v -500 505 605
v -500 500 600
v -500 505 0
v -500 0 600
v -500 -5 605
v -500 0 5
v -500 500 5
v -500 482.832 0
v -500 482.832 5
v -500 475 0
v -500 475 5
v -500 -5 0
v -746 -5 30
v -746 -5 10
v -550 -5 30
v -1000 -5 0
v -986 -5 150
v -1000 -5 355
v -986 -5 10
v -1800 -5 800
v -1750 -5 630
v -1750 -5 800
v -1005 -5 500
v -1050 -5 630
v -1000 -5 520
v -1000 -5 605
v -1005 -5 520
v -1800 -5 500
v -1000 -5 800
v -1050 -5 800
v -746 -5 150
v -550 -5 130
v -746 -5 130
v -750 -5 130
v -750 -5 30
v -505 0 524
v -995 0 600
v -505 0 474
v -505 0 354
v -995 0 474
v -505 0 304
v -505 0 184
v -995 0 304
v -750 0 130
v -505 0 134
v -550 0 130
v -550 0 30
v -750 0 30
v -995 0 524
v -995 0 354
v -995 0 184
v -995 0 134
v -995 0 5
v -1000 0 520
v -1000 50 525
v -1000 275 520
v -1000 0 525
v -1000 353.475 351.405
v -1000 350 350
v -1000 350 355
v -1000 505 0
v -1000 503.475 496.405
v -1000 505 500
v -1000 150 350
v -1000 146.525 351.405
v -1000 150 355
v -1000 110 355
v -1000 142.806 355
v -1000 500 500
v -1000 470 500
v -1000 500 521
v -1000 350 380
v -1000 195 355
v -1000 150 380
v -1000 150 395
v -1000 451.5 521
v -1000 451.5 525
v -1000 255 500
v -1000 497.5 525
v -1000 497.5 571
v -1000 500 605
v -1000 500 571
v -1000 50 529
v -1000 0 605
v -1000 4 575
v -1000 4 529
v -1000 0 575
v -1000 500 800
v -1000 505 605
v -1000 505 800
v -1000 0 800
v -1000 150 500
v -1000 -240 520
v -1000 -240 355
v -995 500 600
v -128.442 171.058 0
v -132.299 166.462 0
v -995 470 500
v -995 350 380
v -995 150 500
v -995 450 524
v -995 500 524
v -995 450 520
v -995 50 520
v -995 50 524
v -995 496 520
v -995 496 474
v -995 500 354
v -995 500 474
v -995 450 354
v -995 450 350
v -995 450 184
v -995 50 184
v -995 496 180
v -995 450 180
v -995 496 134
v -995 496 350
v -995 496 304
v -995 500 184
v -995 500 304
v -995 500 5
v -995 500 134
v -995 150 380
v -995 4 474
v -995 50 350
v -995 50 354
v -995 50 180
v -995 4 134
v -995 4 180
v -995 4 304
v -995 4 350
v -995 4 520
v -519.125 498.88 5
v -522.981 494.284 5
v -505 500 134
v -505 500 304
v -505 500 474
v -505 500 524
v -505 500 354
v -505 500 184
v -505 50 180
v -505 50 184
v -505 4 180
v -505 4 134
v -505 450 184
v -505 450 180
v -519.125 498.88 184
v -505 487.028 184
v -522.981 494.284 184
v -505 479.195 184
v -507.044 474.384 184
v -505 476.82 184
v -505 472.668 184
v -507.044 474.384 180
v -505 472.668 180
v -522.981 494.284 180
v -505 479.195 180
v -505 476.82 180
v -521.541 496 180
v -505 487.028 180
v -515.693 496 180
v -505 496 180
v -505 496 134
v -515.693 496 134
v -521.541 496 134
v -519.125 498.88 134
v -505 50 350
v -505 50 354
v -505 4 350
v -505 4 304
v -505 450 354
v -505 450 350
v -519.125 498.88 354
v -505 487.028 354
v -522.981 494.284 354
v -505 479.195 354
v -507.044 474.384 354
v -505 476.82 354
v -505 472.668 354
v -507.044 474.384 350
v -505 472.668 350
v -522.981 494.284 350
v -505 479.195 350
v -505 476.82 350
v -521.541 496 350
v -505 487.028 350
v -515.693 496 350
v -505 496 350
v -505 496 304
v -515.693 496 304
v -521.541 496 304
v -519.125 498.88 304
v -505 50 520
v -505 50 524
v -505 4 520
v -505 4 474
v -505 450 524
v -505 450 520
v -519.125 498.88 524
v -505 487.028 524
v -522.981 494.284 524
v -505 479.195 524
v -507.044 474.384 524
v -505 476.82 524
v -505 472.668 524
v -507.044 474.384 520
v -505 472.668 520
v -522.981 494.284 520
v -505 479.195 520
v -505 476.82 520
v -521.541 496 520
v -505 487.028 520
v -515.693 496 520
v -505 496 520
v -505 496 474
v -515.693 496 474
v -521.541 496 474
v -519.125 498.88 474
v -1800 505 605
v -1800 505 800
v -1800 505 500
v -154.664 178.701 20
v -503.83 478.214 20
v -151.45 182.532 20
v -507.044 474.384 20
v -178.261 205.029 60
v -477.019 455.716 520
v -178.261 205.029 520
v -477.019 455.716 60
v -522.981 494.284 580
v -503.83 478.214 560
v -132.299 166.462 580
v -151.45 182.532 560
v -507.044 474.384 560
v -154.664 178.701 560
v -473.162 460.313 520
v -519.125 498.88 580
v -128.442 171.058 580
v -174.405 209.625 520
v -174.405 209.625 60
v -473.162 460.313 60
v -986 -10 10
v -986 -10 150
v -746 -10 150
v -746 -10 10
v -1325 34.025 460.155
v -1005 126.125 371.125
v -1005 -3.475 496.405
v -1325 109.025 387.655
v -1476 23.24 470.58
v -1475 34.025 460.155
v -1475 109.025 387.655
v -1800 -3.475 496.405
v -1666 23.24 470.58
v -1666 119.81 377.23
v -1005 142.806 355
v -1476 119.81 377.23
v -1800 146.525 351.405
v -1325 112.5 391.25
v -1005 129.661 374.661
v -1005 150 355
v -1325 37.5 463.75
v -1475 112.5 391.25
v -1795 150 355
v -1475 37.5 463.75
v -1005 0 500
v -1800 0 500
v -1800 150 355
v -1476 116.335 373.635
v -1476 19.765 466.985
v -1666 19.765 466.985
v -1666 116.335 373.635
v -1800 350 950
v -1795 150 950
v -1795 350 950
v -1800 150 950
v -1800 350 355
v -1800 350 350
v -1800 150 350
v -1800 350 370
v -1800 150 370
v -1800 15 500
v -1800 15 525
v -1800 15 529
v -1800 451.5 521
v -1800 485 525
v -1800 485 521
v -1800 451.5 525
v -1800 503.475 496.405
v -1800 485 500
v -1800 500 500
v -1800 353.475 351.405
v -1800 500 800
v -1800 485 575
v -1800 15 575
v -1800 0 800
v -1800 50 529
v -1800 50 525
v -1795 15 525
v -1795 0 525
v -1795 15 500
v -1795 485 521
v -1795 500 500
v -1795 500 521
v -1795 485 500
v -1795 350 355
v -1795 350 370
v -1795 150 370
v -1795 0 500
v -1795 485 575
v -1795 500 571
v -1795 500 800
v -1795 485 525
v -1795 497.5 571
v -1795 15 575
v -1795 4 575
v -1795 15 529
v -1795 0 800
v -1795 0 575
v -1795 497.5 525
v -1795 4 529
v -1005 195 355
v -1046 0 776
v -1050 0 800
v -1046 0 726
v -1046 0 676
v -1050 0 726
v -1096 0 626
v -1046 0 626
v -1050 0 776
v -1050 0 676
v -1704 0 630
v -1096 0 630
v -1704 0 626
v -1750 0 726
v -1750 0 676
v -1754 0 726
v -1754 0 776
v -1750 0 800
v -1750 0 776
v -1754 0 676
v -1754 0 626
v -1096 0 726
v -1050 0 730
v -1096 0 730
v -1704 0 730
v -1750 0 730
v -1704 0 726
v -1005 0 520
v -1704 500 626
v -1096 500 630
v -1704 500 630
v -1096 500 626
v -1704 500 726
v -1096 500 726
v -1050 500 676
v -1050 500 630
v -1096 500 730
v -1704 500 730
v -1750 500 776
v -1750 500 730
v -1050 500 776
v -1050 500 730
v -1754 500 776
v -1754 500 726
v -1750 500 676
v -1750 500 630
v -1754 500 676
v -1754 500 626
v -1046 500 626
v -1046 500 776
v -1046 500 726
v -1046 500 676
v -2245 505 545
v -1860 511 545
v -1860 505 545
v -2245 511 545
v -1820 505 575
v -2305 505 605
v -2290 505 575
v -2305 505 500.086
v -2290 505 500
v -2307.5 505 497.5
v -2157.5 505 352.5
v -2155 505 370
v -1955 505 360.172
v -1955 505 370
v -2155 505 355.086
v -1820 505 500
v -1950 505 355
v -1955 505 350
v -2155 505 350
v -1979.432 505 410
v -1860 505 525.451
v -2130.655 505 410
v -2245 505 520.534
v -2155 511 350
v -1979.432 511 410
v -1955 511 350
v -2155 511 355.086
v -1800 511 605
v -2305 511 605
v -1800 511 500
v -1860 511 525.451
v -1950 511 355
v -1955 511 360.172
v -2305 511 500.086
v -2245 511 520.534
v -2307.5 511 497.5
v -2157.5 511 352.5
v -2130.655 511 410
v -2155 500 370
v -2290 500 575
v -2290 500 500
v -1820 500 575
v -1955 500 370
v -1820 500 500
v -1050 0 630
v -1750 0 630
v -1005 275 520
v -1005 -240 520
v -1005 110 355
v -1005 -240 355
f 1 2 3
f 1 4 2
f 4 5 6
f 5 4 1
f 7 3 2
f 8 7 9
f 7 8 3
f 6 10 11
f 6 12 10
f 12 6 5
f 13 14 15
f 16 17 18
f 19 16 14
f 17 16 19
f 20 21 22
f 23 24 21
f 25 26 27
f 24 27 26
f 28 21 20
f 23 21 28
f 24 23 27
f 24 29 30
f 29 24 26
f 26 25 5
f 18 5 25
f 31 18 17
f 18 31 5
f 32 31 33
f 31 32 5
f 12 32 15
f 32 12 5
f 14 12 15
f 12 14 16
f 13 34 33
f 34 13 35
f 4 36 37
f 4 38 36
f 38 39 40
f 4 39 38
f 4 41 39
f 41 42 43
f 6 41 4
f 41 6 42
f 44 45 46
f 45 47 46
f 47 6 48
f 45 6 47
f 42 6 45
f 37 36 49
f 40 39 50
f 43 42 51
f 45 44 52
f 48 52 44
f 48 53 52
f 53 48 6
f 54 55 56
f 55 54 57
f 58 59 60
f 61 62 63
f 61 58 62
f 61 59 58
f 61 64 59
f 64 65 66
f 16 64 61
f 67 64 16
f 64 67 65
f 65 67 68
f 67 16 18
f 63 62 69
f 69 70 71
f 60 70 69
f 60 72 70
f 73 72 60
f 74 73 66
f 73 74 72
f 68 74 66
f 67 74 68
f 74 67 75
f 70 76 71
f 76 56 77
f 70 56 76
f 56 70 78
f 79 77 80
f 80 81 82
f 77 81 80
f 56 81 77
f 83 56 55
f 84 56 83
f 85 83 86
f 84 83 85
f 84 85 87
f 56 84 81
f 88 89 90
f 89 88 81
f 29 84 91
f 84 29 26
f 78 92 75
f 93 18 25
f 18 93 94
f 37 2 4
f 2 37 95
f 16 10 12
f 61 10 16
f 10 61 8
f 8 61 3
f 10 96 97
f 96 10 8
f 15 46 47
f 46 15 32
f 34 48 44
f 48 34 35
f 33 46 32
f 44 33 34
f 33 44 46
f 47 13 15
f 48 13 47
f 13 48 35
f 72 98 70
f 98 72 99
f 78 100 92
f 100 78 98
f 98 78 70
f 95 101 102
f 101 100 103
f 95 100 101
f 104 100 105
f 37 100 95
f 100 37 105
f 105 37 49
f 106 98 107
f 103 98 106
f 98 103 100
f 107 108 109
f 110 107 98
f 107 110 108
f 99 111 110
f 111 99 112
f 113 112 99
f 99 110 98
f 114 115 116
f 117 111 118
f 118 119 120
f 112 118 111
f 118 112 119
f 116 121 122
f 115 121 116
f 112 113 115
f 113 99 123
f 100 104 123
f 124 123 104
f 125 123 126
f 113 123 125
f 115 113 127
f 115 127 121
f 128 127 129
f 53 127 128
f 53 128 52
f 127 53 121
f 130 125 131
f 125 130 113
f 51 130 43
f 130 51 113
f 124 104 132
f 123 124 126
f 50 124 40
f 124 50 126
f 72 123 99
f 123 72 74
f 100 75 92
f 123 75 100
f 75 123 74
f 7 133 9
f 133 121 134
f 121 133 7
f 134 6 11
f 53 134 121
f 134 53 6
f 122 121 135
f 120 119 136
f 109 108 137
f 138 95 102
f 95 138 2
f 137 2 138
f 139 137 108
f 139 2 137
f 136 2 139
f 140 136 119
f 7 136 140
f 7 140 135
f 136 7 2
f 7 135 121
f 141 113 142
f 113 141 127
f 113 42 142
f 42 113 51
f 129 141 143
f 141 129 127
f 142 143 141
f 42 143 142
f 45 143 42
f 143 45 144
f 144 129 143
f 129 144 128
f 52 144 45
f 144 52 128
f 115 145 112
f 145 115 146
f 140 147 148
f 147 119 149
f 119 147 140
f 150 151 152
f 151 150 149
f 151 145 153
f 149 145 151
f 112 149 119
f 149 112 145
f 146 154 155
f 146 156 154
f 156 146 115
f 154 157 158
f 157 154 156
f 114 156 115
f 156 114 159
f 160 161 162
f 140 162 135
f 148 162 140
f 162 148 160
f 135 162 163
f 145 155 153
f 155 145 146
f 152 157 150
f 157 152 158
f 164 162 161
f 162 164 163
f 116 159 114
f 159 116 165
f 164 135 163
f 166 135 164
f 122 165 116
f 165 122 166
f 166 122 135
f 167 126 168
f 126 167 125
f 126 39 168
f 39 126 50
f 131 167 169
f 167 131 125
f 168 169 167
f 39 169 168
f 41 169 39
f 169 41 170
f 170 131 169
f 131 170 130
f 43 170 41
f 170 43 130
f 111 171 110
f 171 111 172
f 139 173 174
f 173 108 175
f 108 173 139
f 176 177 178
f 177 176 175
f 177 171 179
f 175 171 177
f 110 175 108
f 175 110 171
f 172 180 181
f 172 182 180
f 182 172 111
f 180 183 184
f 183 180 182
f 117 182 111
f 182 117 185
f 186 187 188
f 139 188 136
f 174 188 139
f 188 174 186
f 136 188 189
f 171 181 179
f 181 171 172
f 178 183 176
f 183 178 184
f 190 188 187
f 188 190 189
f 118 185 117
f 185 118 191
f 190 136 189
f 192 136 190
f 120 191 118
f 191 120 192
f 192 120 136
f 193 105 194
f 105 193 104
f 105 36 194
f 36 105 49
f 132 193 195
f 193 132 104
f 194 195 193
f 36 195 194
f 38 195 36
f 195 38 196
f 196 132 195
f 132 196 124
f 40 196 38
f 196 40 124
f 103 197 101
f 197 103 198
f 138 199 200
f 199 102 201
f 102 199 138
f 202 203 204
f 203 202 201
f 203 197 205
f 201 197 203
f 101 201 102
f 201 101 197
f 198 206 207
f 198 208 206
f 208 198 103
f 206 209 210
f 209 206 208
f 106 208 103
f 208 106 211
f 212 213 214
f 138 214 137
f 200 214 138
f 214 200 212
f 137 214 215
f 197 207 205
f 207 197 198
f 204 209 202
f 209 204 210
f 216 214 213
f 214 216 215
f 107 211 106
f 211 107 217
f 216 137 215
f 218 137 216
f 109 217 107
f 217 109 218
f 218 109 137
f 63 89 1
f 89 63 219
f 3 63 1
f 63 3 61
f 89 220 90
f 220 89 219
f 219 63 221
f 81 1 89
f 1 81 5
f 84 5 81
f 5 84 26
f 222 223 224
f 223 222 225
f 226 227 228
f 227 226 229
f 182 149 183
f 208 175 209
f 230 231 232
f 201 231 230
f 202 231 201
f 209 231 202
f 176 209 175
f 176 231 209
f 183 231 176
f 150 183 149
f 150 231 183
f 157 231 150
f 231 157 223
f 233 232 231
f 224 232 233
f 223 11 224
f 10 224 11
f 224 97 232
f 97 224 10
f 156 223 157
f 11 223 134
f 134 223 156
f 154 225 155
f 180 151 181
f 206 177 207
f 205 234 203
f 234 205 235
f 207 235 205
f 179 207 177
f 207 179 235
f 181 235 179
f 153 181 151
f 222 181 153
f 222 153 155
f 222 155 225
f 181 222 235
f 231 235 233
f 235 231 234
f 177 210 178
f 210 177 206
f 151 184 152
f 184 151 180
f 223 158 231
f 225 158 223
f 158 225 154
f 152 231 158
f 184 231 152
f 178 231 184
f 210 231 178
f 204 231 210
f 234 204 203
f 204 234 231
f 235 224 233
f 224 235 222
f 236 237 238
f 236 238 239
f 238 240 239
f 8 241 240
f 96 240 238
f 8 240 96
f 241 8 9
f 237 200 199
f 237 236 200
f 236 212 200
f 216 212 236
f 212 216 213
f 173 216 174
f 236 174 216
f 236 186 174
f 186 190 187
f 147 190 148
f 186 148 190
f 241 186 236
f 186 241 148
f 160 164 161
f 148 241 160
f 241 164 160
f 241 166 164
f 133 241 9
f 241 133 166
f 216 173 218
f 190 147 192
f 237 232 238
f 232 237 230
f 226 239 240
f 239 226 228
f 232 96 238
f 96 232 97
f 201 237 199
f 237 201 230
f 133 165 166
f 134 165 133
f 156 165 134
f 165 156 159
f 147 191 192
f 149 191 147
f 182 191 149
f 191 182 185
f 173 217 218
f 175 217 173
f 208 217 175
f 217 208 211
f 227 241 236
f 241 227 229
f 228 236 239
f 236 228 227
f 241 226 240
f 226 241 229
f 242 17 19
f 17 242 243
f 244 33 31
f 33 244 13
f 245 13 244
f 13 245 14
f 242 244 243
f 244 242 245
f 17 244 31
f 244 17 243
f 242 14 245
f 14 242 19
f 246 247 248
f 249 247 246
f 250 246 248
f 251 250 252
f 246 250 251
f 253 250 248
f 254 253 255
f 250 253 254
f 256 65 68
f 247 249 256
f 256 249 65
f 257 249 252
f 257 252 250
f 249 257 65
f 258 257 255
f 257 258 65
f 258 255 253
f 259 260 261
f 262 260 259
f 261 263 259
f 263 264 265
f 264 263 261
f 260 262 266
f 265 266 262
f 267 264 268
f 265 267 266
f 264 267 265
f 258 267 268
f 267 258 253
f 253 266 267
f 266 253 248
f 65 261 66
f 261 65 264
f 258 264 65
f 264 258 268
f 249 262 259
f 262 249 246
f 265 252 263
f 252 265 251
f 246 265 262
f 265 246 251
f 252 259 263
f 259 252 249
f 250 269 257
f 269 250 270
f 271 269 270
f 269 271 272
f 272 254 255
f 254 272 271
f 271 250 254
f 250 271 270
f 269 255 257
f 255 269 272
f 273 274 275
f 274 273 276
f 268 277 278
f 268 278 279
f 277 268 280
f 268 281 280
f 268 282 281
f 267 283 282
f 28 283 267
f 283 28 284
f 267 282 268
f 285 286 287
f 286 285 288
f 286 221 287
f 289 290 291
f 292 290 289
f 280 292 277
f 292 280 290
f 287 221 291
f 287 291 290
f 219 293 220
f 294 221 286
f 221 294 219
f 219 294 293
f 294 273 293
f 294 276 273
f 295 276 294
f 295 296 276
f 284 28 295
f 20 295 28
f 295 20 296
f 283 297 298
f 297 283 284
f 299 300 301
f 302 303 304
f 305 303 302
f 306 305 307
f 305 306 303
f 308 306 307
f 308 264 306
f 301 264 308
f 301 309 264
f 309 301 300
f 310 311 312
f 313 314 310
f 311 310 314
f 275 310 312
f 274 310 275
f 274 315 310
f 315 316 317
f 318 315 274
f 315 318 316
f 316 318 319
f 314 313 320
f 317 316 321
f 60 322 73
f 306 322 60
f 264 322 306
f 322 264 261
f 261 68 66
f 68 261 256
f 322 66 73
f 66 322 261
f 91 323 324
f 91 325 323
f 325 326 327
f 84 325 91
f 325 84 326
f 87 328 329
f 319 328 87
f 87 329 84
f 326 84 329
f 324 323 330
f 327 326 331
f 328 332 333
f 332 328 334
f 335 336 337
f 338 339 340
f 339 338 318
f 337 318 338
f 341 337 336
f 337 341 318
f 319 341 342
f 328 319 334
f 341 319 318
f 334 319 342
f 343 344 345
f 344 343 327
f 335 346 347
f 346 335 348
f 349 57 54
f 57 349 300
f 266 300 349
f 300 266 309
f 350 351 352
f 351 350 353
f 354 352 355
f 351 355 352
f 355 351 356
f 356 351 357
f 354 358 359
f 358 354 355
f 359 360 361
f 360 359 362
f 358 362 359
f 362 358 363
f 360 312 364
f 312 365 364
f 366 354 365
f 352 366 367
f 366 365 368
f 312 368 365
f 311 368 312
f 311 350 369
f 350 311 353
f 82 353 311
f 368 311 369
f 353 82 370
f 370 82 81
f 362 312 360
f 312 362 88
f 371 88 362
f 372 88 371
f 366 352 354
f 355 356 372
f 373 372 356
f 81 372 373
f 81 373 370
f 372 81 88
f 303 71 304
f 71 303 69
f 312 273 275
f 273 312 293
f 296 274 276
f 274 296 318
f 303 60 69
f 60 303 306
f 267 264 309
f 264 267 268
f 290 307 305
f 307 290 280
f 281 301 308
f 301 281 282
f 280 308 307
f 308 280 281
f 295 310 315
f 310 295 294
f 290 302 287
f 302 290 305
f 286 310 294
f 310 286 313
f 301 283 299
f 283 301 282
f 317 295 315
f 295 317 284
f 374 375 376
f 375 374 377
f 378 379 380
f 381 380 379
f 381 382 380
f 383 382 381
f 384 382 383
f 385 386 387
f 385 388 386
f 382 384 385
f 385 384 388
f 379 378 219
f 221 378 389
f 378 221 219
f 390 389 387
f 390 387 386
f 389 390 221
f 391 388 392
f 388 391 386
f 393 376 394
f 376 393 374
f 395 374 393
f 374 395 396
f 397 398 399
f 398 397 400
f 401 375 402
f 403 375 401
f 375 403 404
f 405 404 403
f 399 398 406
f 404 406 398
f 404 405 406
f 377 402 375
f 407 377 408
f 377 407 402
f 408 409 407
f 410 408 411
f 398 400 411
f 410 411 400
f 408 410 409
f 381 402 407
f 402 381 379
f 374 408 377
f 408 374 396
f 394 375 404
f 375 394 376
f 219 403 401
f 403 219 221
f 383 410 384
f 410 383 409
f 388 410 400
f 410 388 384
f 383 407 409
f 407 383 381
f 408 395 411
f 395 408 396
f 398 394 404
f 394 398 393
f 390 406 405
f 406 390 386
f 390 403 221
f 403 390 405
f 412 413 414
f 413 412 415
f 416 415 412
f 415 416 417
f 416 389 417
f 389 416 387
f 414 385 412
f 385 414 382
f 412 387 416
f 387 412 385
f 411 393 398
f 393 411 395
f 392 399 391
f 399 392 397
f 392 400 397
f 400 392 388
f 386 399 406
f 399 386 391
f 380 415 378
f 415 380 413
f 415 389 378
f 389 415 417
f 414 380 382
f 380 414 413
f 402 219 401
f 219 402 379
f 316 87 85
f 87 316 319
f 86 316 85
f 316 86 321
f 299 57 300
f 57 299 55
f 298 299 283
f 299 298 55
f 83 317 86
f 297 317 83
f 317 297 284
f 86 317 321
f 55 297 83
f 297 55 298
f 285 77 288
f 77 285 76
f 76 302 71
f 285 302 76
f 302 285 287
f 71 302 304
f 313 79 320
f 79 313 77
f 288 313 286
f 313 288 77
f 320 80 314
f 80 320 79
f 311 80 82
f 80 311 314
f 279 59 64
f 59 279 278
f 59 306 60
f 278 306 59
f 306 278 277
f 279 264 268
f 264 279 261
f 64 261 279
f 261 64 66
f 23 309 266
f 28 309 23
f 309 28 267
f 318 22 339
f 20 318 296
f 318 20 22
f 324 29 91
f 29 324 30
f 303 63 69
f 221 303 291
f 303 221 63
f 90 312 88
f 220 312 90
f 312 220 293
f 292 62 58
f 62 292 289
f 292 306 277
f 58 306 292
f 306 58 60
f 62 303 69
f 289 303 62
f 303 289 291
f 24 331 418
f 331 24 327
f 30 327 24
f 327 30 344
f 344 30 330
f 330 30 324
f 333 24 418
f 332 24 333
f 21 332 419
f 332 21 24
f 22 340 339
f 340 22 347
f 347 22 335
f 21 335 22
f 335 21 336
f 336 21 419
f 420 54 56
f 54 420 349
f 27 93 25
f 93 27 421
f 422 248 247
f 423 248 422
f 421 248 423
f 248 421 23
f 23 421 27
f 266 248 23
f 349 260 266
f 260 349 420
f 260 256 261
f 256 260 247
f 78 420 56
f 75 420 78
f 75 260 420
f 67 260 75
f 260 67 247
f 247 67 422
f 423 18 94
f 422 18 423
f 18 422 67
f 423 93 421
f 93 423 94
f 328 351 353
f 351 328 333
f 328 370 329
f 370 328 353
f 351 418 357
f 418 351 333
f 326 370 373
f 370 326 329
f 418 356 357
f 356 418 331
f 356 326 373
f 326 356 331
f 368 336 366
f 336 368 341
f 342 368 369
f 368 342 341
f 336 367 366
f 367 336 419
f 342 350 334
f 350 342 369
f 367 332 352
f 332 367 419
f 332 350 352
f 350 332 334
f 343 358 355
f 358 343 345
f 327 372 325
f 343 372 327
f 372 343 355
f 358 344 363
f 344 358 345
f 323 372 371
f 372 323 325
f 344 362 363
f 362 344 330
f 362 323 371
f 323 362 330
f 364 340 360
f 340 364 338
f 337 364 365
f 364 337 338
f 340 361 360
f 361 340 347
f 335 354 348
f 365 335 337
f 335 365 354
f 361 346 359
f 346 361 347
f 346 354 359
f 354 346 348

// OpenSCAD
// file: helper.scad
module prism(l, w, h){
    polyhedron(
            points=[[0,0,0], [l,0,0], [l,w,0], [0,w,0], [0,w,h], [l,w,h]],
            faces=[[0,1,2,3],[5,4,3,2],[0,4,5,1],[0,3,4],[5,2,1]]
        );
}

module prism2(l, w) {
	polygon([[0,0], [l, 0], [l, w]]);
}
// main file
include <helper.scad>

//
// All numbers are in millimeter
//

thick = 5;

angleWidth = 50;
angleHeight = 50;
angleThick = 4;

// Firebox

fbW = 500;
fbD = 500;
fbH = 600;

/// Firebox basket

fbBkMinBottomOffset = 30;
fbBkMaxBottomOffset = 30;
fbBkHeight = 200;
fbBkNumRacks = 3;

/// Firebox door
fbDrD = fbD - 40;
fbDrH = fbH - 60;
fbDrHO = 20;

fbRotate = 50;

fbDrBandWidth = 60;
fbDrBandThick = 6;

/// Firebox air intake
fbAIOpen = 0.9;

// Smoke Stack
ssW = fbW;
ssD = fbD;
ssH = 800;

/// Smoke Stack door
ssDrW = ssW - 40;
ssDrH = ssH - 60;
ssDrHO = 20;

ssDrRotate = 50;

ssDrBandWidth = fbDrBandWidth;
ssDrBandThick = fbDrBandThick;

/// FireBox Crates

ssCrMinBottomOffset = 30;
ssCrMaxOffset = 70;
ssCrNumRacks = 5;

// Chamber

chamBottomD = 200;
chamTopD = 200;
chamBackH = 300;
chamFrontH = 300;
chamWidth = 800;
chamOffset = 350; // the Z offset of the chamber in relation to the firebox
chamHeight = 600;
chamFrontBackOffset = 150;

/// Chamber Door

chamDoorWidth = chamWidth - 100;
chamDoorDepth = 250;
chamDoorHeight = 325;
chamDoorRotate = 70;

chamBandWidth = fbDrBandWidth;
chamBandThick = fbDrBandThick;

/// Chamber Face Door

chamFaceDoorHeight = 75;
chamFaceSealWidth = 30;
chamFaceDoorRotate = 90;

chamFaceBandWidth = fbDrBandWidth;
chamFaceBandThick = fbDrBandThick;

/// Chamber Air Intake
chamAIOpen = 0.9;

// Firebox - Chamber Hatch

fbChamPercentOpen = 0.6;

module angle(l) {
	union() {
		cube([angleWidth, l, angleThick]);	
		translate([0,0, -(angleHeight - angleThick)]) {
			cube([angleThick, l, angleHeight - angleThick]);
		}
	}
}

module box(plan, x, y) {
	if(plan) {
		square(size=[x, y]);
	} else {
		cube([x, y, thick]);
	}
}

module text2(plan, t, x, y, zR = 0) {
	translate([x, y, 0]) {
		rotate([0, 0, zR]) {
			if(plan) {
				text(t, size=40);
			} else {
				linear_extrude(height = thick) {
					text(t, size=40);
				}
			}
		}
	}
}

module doc(plan, top, wText, wPos, dText, dPos) {
	if(plan) {
		echo(str("\"",top, "\", ", wPos, ", ", dPos));
		text2(plan, top, 0, dPos + 70);
		text2(plan, str(wText, " = ", wPos), 0, dPos + 20);
		text2(plan, str(dText, " = ", dPos), wPos + 20, dPos, 270);
	}	
}

tubeSide=100;
tubeThick=3;
tubeIns=2;

module rotate_about_pt3(pt, x, z, y) {
    translate(pt)
        rotate([x, y, z]) // CHANGE HERE
            translate(-pt)
                children();   
}

module rotate_about_pt(z, y, pt) {
    translate(pt)
        rotate([0, y, z]) // CHANGE HERE
            translate(-pt)
                children();   
}
   
module tube(len,bCut=false,bAngle=0,tCut=false,tAngle=0) {
	difference() {
		cube([tubeSide,tubeSide,len]);
		if(bCut) {
			rotate_about_pt(bAngle, 0, [tubeSide/2, tubeSide/2,0]) {
				prism(tubeSide,tubeSide,tubeSide);
			}
		}
		if(tCut) {
			translate([0,0,len]) {
				rotate_about_pt(tAngle, 180, [tubeSide/2, tubeSide/2,0]) {
					prism(tubeSide,tubeSide,tubeSide);
				}
			}
		}
		translate([tubeThick,tubeThick,0]) {
			cube([tubeSide-2*tubeThick,tubeSide-2*tubeThick,len+1]);
		}
	}
}

// Chamber Begin

module chamBottom(plan) {
	box(plan, chamWidth, chamBottomD);
	doc(plan, "Chamber bottom", "W", chamWidth, "D", chamBottomD);
}

module chamTop(plan) {
	box(plan, chamWidth, chamTopD);
	doc(plan, "Chamber top", "W", chamWidth, "D", chamTopD);
}

module chamFront(plan) {
	box(plan, chamWidth, chamFrontH);
	doc(plan, "Chamber front", "W", chamWidth, "H", chamFrontH);
}

module chamBack(plan) {
	box(plan, chamWidth, chamBackH);
	doc(plan, "Chamber back", "W", chamWidth, "H", chamBackH);
}

module chamBottomFront(plan) {
	dB = (fbD - chamBottomD) / 2;
	h = sqrt(pow(dB, 2) + pow(chamFrontBackOffset - thick, 2));
	doc(plan, "Chamber bottom front", "W", chamWidth, "H", h);
	aiW = 150;
	aiH = h / 2;
	difference() {
		box(plan, chamWidth, h);
		translate([chamWidth/2-aiW/2, h / 2 - aiH / 2, 0]) {
			box(plan, aiW, aiH);
		}
	}
	if(!plan) {
		cAIw = (aiW + 40) * chamAIOpen;
		translate([chamWidth/2-aiW/2 - 20 - cAIw, h / 2 - aiH / 2 - 15, thick]) {
			box(plan, aiW + 40, aiH + 30);
		}
	}
}

module chamBottomBack(plan) {
	dB = (fbD - chamBottomD) / 2;
	h = sqrt(pow(dB, 2) + pow(chamFrontBackOffset - thick, 2));
	box(plan, chamWidth, h);
	doc(plan, "Chamber bottom back", "W", chamWidth, "H", h);
}

module chamBackTop(plan) {
	dB = (fbD - chamTopD) / 2;
	h = sqrt(pow(dB, 2) + pow(chamHeight - chamBackH - chamFrontBackOffset, 2));
	box(plan, chamWidth, h);
	doc(plan, "Chamber back top", "W", chamWidth, "H", h);
}

module chamFrontTop(plan) {
	dB = (fbD - chamTopD) / 2;
	h = sqrt(pow(dB, 2) + pow(chamHeight - chamFrontH - chamFrontBackOffset, 2));
	box(plan, chamWidth, h);
	doc(plan, "Chamber front top", "W", chamWidth, "H", h);
}

module chamFaceDoor(plan, bands=false) {
	dT = (fbD - chamTopD) / 2;
	dB = (fbD - chamBottomD) / 2;
	d = chamTopD < chamBottomD ? chamTop : chamBottomD;
	dS = fbD - d;

	union() {
		sealWidth = chamFaceSealWidth / 2;
		translate([0, dS / 2 + d + dT - sealWidth, thick]) {
			if(plan) {
				translate([-(chamFrontBackOffset - sealWidth - thick), -dB + sealWidth, -thick]) {
					rotate([0,0,0]) {
						prism2(chamFrontBackOffset - thick - sealWidth, dB - sealWidth);
					}
				}
			} else {
				rotate([180,90,0]) {
					prism(thick, dB - sealWidth, chamFrontBackOffset - thick - sealWidth);
				}
			}
		}
		translate([0, +sealWidth, 0]) {
			if(plan) {
				translate([0, 0, 0]) {
					rotate([0,0,90]) {
						prism2(dB - sealWidth, chamFrontBackOffset - thick - sealWidth);
					}
				}
			} else {
				rotate([180,-90,180]) {
					prism(thick, dB - sealWidth, chamFrontBackOffset - thick - sealWidth);
				}
			}
		}
		translate([0, dB, thick]) {
			if(plan) {
				translate([0, 0, -thick]) {
					rotate([180,0,180]) {
						box(plan, chamFrontBackOffset - thick - sealWidth, chamBottomD);
					}
				}
			} else {
				rotate([180,0,180]) {
					box(plan, chamFrontBackOffset - thick - sealWidth, chamBottomD);
				}
			}
		}
		if(bands) {
			translate([-(chamFaceBandWidth + sealWidth * 2), dB, thick + chamFaceBandThick]) {
				rotate([180,0,180]) {
					cube([chamFaceBandWidth, chamBottomD, chamFaceBandThick]);
				}
			}
		}
		translate([0, sealWidth, 0]) {
			if(plan) {
				translate([0, 0, 0]) {
					rotate([0,0,0]) {
						box(plan, chamFaceDoorHeight, fbD - chamFaceSealWidth);
					}
				}
			} else {
				rotate([0,0,0]) {
					box(plan, chamFaceDoorHeight, fbD - chamFaceSealWidth);
				}
			}
		}
		if(bands) {
			translate([(chamFaceDoorHeight + sealWidth * 2), 0, thick + chamFaceBandThick]) {
				rotate([180,0,180]) {
					cube([chamFaceBandWidth, fbD + thick, chamFaceBandThick]);
				}
			}
		}
		if(bands) {
			translate([(chamFaceDoorHeight - sealWidth * 2), 0, thick + chamFaceBandThick]) {
				rotate([180,0,180]) {
					cube([chamFaceBandWidth - sealWidth, chamFaceBandWidth, chamFaceBandThick]);
				}
			}
			translate([(chamFaceDoorHeight - sealWidth * 2), fbD - chamFaceBandWidth + thick, thick + chamFaceBandThick]) {
				rotate([180,0,180]) {
					cube([chamFaceBandWidth - sealWidth, chamFaceBandWidth, chamFaceBandThick]);
				}
			}
			dB = (fbD - chamBottomD) / 2;
			h2 = sqrt(pow(dB, 2) + pow(chamFrontBackOffset - thick, 2));
			translate([-thick/2, -thick/2, thick]) {
				d = dB;
				h = chamFrontBackOffset - thick;

				angle = atan(h / d);
				
				rotate([0, 0, angle]) {
					cube([chamFaceBandWidth, h2, chamFaceBandThick]);
				}
			}
			translate([0, fbD+thick, thick]) {
				d = dB;
				h = chamFrontBackOffset - thick;

				angle = atan(h / d);
				rotate([0, 0, 180-angle]) {
					translate([-chamFaceBandWidth, 0, 0]) {
						cube([chamFaceBandWidth, h2, chamFaceBandThick]);
					}
				}
			}
		}
	}
}

module chamFace(plan) {
	dT = (fbD - chamTopD) / 2;
	dB = (fbD - chamBottomD) / 2;
	d = chamTopD < chamBottomD ? chamTop : chamBottomD;
	dS = fbD - d;
	difference() {
		union() {
			translate([0, dT < dB ? dT : dB, 0]) {
				box(plan, chamHeight - thick, d);
			}

			translate([chamFrontBackOffset - thick, 0, 0]) {
				box(plan, chamFrontH, dS / 2);
			}

			translate([chamFrontBackOffset - thick, dS / 2 + d, 0]) {
				box(plan, chamBackH, dS / 2);
			}

			translate([chamFrontBackOffset + chamBackH - thick, dS / 2 + d + dT, 0]) {
				if(plan) {
					rotate([0,0,-90]) {
						prism2(dT, chamHeight - chamFrontBackOffset - chamBackH);
					}
				} else {
					rotate([0,-90,180]) {
						prism(thick, dT, chamHeight - chamFrontBackOffset - chamBackH);
					}
				}
			}

			translate([chamFrontBackOffset + chamFrontH - thick, 0, thick]) {
				if(plan) {
					translate([chamHeight - chamFrontBackOffset - chamFrontH, dT, -thick]) {
						rotate([0,0,-180]) {
							prism2(chamHeight - chamFrontBackOffset - chamFrontH, dT);
						}
					}
				} else {
					rotate([0,90,0]) {
						prism(thick, dT, chamHeight - chamFrontBackOffset - chamBackH);
					}
				}
			}

			translate([chamFrontBackOffset - thick, dS / 2 + d + dT, thick]) {
				if(plan) {
					translate([-(chamFrontBackOffset - thick), -dB, -thick]) {
						rotate([0,0,0]) {
							prism2(chamFrontBackOffset - thick, dB);
						}
					}
				} else {
					rotate([180,90,0]) {
						prism(thick, dB, chamFrontBackOffset - thick);
					}
				}
			}

			translate([chamFrontBackOffset - thick, 0, 0]) {
				if(plan) {
					translate([0, 0, 0]) {
						rotate([0,0,90]) {
							prism2(dB, chamFrontBackOffset - thick);
						}
					}
				} else {
					rotate([180,-90,180]) {
						prism(thick, dB, chamFrontBackOffset - thick);
					}
				}
			}
		}
		translate([chamFrontBackOffset - thick, 0, 0]) {
			chamFaceDoor(plan);
		}
	}

	if(!plan) {
		translate([chamFrontBackOffset-thick,0,0]) {
			rotate_about_pt3([chamFrontBackOffset - thick, fbD + thick, thick]
				, -chamFaceDoorRotate, 0, 0) 
			{
				chamFaceDoor(plan, true);
			}
		}
	}

	if(plan) {
		text2(plan, "Cham face", 10, fbD + 180, 0);
		text2(plan, str("Overall = ", chamHeight), chamFrontBackOffset, fbD + 80, 0);
		text2(plan, str("Back = ", chamBackH), chamFrontBackOffset, fbD + 30, 0);
		text2(plan, str("Front = ", chamFrontH), chamFrontBackOffset, -70, 0);
		text2(plan, str("FrontBackOffset = ", chamFrontBackOffset), chamFrontBackOffset, -140, 0);
		text2(plan, str("Cham top = ", chamTopD), chamHeight + 30, fbD, -90);
		text2(plan, str("Cham bottom = ", chamBottomD), -50, fbD, -90);
	}
}

module chamCoalBasket(plan) {
	rotate([0,270,0]) {
		angle(chamWidth);
	}	
	translate([fbD - thick / 2, 0, 0]) {
		rotate([0,180,0]) {
			angle(chamWidth);
		}	
	}
}

module chamGrades(plan) {
	rotate([0,180,0]) {
		angle(fbD + thick);
	}
	translate([-chamDoorWidth - angleThick, 0, -angleThick]) {
		rotate([0,270,0]) {
			angle(fbD + thick);
		}
	}
}

// Chamber End

// Smoke stack Begin

module ssBack(plan) {
	box(plan, ssW, ssH);
	doc(plan, "Smoke stack back", "W", ssW, "H", ssH);
}

module ssFront(plan) {
	h = ssH - thick;
	wDP = (ssW - ssDrW) / 2;
	difference() {
		box(plan, ssW, ssH);
		translate([ssDrHO,wDP,0]) {
			box(plan, ssDrW, ssDrH);
		}
	}
	doc(plan, "Smoke front", "W", ssW, "H", ssH);
	if(plan) {
		text2(plan, str("W = ", ssDrW), ssW - 250, wDP + 20);
		text2(plan, str("H = ", ssDrH), ssDrHO + 20, ssDrH, -90);
		text2(plan, str("H.Os = ", ssDrHO), ssW - ssDrW + 30, ssDrHO + 20, 90);
		text2(plan, str("W.Os = ", wDP), ssW - 300, ssH - (ssH - ssDrH + ssDrHO + 20));
	}
}

module ssDoor(plan) {
	echo(str("ssDrBandWidth ", ssDrBandWidth));
	echo(str("ssDrBandThick ", ssDrBandThick));
	box(plan, ssDrH, ssDrW);

	translate([-ssDrHO, -20, thick]) {
		cube([ssDrH + ssDrHO * 2, ssDrBandWidth, ssDrBandThick]);
	}

	translate([-ssDrHO, ssDrW + 20 - ssDrBandWidth, thick]) {
		cube([ssDrH + ssDrHO * 2, ssDrBandWidth, ssDrBandThick]);
	}

	translate([-ssDrHO, -20 + ssDrBandWidth, thick]) {
		cube([ssDrBandWidth, ssW - (2 * ssDrBandWidth), ssDrBandThick ]);
	}

	translate([ssDrH - ssDrBandWidth + ssDrHO, -20 + ssDrBandWidth, thick]) {
		cube([ssDrBandWidth, ssW - (2 * ssDrBandWidth), ssDrBandThick ]);
	}
}

module ssRight(plan) {
	h = ssH - thick;
	box(plan, h, ssD);
	doc(plan, "Smoke stack right", "H", h, "D", ssD);
}

module ssLeft(plan) {
	h = ssH - thick;
	box(plan, h, ssD);
	doc(plan, "Smoke stack left", "H", h, "D", ssD);
}

module ssTop(plan) {
	box(plan, ssW, ssD);
	doc(plan, "Smoke stack top", "W", ssW, "D", ssD);
}

module ssCrates(plan) {
	h = (ssH - ssCrMaxOffset - angleHeight) - (ssCrMinBottomOffset + angleHeight);
	echo(str("SS.H ", h));
	stepHeight = h / (ssCrNumRacks - 1);
	echo(str("SS.S ", stepHeight));
	for(i = [(ssCrMinBottomOffset + angleHeight) : stepHeight : (ssH - ssCrMaxOffset)]) {
		echo(str("SS.i ", i));
		translate([ssD,thick,i]) {
			rotate([0,0,90]) {
				angle(ssD);
			}
		}
		translate([0,ssD-thick,i]) {
			rotate([0,0,-90]) {
				angle(ssD);
			}
		}
	}
}

module ssBuild(plan) {
	translate([0,ssD+thick,fbH+thick]) {
		rotate([90,0,0]) {
			ssBack(plan);
		}
	}
	translate([0,0,fbH+thick]) {
		rotate([90,0,0]) {
			ssFront(plan);
		}
	}

	translate([ssW,0,fbH+thick]) {
		rotate([0,-90,0]) {
			ssRight(plan);
		}
	}

	translate([thick,0,fbH+thick]) {
		rotate([0,-90,0]) {
			ssLeft(plan);
		}
	}

	translate([0,0,fbH+ssH]) {
		rotate([0,0,0]) {
			ssTop(plan);
		}
	}

	translate([ssW,0,fbH + thick]) {
		rotate([0,0,90]) {
			ssCrates(plan);
		}
	}

	translate([(ssW - ssDrW) / 2, 0, fbH + ssDrH + ssDrHO + thick]) {
		rotate([90,90,0]) {
			rotate_about_pt3([0, ssDrW + 20, 5], -ssDrRotate, 0, 0) {
				ssDoor(plan);
			}
		}
	}
}

module ssPlan(plan) {
	ssBack(plan);
	translate([0, ssH + 220, 0]) {
		ssFront(plan);
	}

	translate([ssW + 180, 0, 0]) {
		ssRight(plan);

		translate([0, ssD + 220, 0]) {
			ssLeft(plan);
			translate([0, ssD + 220, 0]) {
				ssTop(plan);
			}
		}
	}
}

// Smoke stack End

// Firebox Begin

module fbBottom(plan) {
	box(plan, fbW, fbD);
	doc(plan, "Firebox bottom", "W", fbW, "D", fbD);
}

module fbBack(plan) {
	box(plan, fbW, fbH);
	doc(plan, "Firebox back", "W", fbW, "H", fbH);
}

module fbFront(plan) {
	doc(plan, "Firebox front", "W", fbW, "H", fbH);
	difference() {
		box(plan, fbW, fbH);
		translate([fbW * 0.50, 30, 0]) {
			box(plan, fbW * 0.4, 100);
		}
	}
}

module fbRight(plan) {
	h = fbH - thick;
	dDP = (fbD - fbDrD) / 2;
	difference() {
		box(plan, h, fbD);
		translate([fbDrHO,dDP,0]) {
			box(plan, fbDrH, fbDrD);
			//doc(plan, "Firebox door", "H", fbDrH, "D", fbDrD);
		}
	}
	doc(plan, "Firebox right", "H", h, "D", fbD);
	if(plan) {
		text2(plan, str("H = ", fbDrH), fbH - (fbDrHO + 240), dDP + 20);
		text2(plan, str("D = ", fbDrD), fbDrHO + 20, fbD - (dDP + 20), -90);
		text2(plan, str("H.Os = ", fbDrHO), fbDrHO, dDP + 20);
		text2(plan, str("D.Os = ", dDP), fbH - (fbH - fbDrH + fbDrHO + 20), fbD - (dDP + 20), -90);
	}
}

module fbLeft(plan) {
	h = fbH - thick;
	doc(plan, "Firebox left", "H", h, "D", fbD);
	difference() {
		box(plan, h, fbD);
		dT = (fbD - chamTopD) / 2 - 30;
		dB = (fbD - chamBottomD) / 2 - 30;
		d = chamTopD < chamBottomD ? chamTop : chamBottomD;
		dS = fbD - d;
		if(plan) {
			translate([chamOffset, fbD - dB - 30, 0]) {
				rotate([0,0,0]) {
					prism2(chamFrontBackOffset - thick, dB);
				}
			}
			translate([chamOffset, fbD - dB - 30 - chamBottomD, 0]) {
				square([chamFrontBackOffset - thick, chamBottomD]);
			}
		} else {
			translate([chamOffset + dB + 30 - thick, fbD - 30, thick]) {
				rotate([0,90,180]) {
					prism(thick, dB, dB);
				}
			}
			translate([chamOffset + 30 - thick, fbD - chamBottomD - dB - 30, 0]) {
				cube([chamFrontBackOffset - 30, chamBottomD, thick]);
			}
		}
	}
}

module fbTop(plan) {
	d = fbD + (thick * 2);
	box(plan, fbW, d);
	doc(plan, "Firebox top", "W", fbW, "D", d);
}

module fbPlan(plan) {
	fbBottom(plan);
	translate([0, fbD + 220, 0]) {
		fbBack(plan);
		translate([0, fbH + 180, 0]) {
			fbFront(plan);
		}
	}

	translate([fbW + 180, 0, 0]) {
		fbRight(plan);

		translate([0, fbD + 220, 0]) {
			fbLeft(plan);
			translate([0, fbD + 220, 0]) {
				fbTop(plan);
			}
		}
	}

}

module fbBasketSlots(plan) {
	h = (fbH - fbBkMaxBottomOffset - angleHeight) - (fbBkMinBottomOffset + fbBkHeight - angleHeight);
	stepHeight = h / (fbBkNumRacks - 1);
	echo(stepHeight);
	for(i = [(fbBkMinBottomOffset + fbBkHeight - angleHeight) : stepHeight : (fbH - fbBkMaxBottomOffset - angleHeight)]) {
		echo(i);
		translate([fbW-thick,0,i]) {
			rotate([0,0,90]) {
				angle(fbW-thick*2);
			}
		}
		translate([thick,fbD,i]) {
			rotate([0,0,-90]) {
				angle(fbW-thick*2);
			}
		}
	}
}

module fbDoor(plan) {
	echo(str("fbDrBandWidth ", fbDrBandWidth));
	echo(str("fbDrBandThick ", fbDrBandThick));
	box(plan, fbDrH, fbDrD);

	translate([-fbDrHO, - ((fbD + 2 * thick) - fbDrD) / 2 , thick]) {
		cube([fbDrH + fbDrHO * 2, fbDrBandWidth, fbDrBandThick]);
	}

	translate([-fbDrHO, fbDrD - fbDrBandWidth / 2 - thick, thick]) {
		cube([fbDrH + fbDrHO * 2, fbDrBandWidth, fbDrBandThick]);
	}

	translate([-fbDrHO, fbDrBandWidth / 2 + thick, thick]) {
		cube([fbDrBandWidth, (fbD + thick * 2) - (fbDrBandWidth * 2), fbDrBandThick ]);
	}

	translate([fbDrH - fbDrBandWidth + fbDrHO, fbDrBandWidth / 2 + thick, thick]) {
		cube([fbDrBandWidth, (fbD + thick * 2) - (fbDrBandWidth * 2), fbDrBandThick ]);
	}
}

module fbBuild(plan) {
	fbBottom(plan);
	difference() {
		union() {
			translate([0,fbD+thick,0]) {
				rotate([90,0,0]) {
					fbBack(plan);
				}
			}
			translate([0,0,0]) {
				rotate([90,0,0]) {
					fbFront(plan);
				}
			}
			translate([fbW,0,thick]) {
				rotate([0,-90,0]) {
					//fbRight(plan);
				}
			}

			translate([thick,0,thick]) {
				rotate([0,-90,0]) {
					fbLeft(plan);
				}
			}

			translate([0,-thick,fbH]) {
				rotate([0,0,0]) {
					fbTop(plan);
				}
			}
			fbBasketSlots(plan);
		}
		union() {
			dT = (fbD - chamTopD) / 2 - 30;
			dB = (fbD - chamBottomD) / 2 - 30;
			d = chamTopD < chamBottomD ? chamTop : chamBottomD;
			dS = fbD - d;
			if(plan) {
				translate([0,0,0]) {
					rotate([0,0,0]) {
						prism2(chamFrontBackOffset - thick, dB);
					}
				}
			} else {
				translate([0, fbW - 30, chamOffset + dB + 30]) {
					rotate([180,0,0]) {
						prism(thick, dB, dB);
					}
				}
			}
		}
	}

	translate([0, -thick, 0]) {
		w = (fbW * 0.4 + 40) * fbAIOpen;
		translate([(fbW * 0.50 - 20) - w, 0, 30 - 20]) {
			rotate([90, 0, 0]) {
				box(plan, fbW * 0.4 + 40, 100 + 40);
			}
		}
	}

	translate([fbW - thick, (fbD - fbDrD) / 2, fbDrH + fbDrHO]) {
		rotate([0,90,0]) {
			rotate_about_pt3([0, fbDrD + (fbD - fbDrD) / 2 + thick - chamBandWidth / 2, thick], -fbRotate, 0, 0) {
				fbDoor(plan);
			}
		}
	}
}

module chamFBvalve() {
	union() {
		dT = (fbD - chamTopD) / 2 - 30;
		dB = (fbD - chamBottomD) / 2 - 30;
		d = chamTopD < chamBottomD ? chamTop : chamBottomD;
		dS = fbD - d;
		translate([chamOffset + dB + 80 - thick, fbD + 15, thick]) {
			rotate([0,90,180]) {
				prism(thick, dB + 45, dB + 45);
			}
		}
		translate([chamOffset + 30, 0, 0]) {
			cube([chamFrontBackOffset + 15, fbD - (chamBottomD/2) - 50, thick]);
		}
	}
}

module chamBuild(plan, door = true) {
	difference() {
		union() {
			dB = (fbD - chamBottomD) / 2;
			translate([-(chamWidth), dB, chamOffset]) {
				chamBottom(plan);
			}

			dT = (fbD - chamTopD) / 2;
			translate([-chamWidth, dT, chamOffset + chamHeight]) {
				//chamTop(plan);
			}

			translate([-chamWidth, 0, chamOffset + chamFrontBackOffset]) {
				rotate([90,0,0]) {
					chamFront(plan);
				}
			}

			translate([-chamWidth, fbD + thick, chamOffset + chamFrontBackOffset]) {
				rotate([90,0,0]) {
					chamBack(plan);
				}
			}

			translate([-chamWidth, dB, chamOffset + thick]) {
				d = dB;
				h = chamFrontBackOffset - thick;

				angle = atan(h / d);
				echo(str("Chamber angle bottom front ", angle));
				
				rotate([180 - angle,0,0]) {
					chamBottomFront(plan);
				}
			}
			
			translate([-chamWidth, fbD, chamOffset + chamFrontBackOffset]) {
				d = dB;
				h = chamFrontBackOffset - thick;

				angle = atan(h / d);
				echo(str("Chamber angle bottom back ", angle));
				
				rotate([180 + angle,0,0]) {
					chamBottomBack(plan);
				}
			}
			
			dbt = (fbD - chamTopD) / 2;
			translate([-chamWidth, dT + chamTopD, chamOffset + chamHeight]) {
				h = chamHeight - chamBackH - chamFrontBackOffset;

				angle = atan(h / dbt);
				echo(str("Chamber angle top back ", angle));
				rotate([-angle,0,0]) {
					//chamBackTop(plan);
				}
			}

			translate([-chamWidth, 0, chamOffset + chamFrontBackOffset + chamFrontH]) {
				h = chamHeight - chamFrontH - chamFrontBackOffset;

				angle = atan(h / dbt);
				echo(str("Chamber angle top front ", angle));
				rotate([angle,0,0]) {
					//chamFrontTop(plan);
				}
			}

			translate([-chamWidth + thick, 0, chamOffset + thick]) {
				rotate([0,-90,0]) {
					chamFace(plan);
				}
			}

			translate([0, angleThick, chamOffset + chamFrontBackOffset + angleWidth / 2 ]) {
				rotate([0,0,90]) {
					chamCoalBasket(plan);
				}
			}

		}
		if(door) {
			translate([-(chamWidth - ((chamWidth - chamDoorWidth) / 2 )), -thick, chamOffset + chamHeight - chamDoorHeight + thick]) {
				cube([chamDoorWidth, chamDoorDepth, chamDoorHeight]);
			}
		}
		dB = (fbD - chamBottomD) / 2 - 30;
		translate([-thick, -thick, chamOffset + 5]) {
			cube([thick,chamBottomD, dB + 30 + 15]);
		}
	}

	if(!plan) {
		translate([0, -((fbD-chamBottomD/2) * fbChamPercentOpen), -25]) {
			rotate([0,-90,0]) {
				chamFBvalve();
			}
		}
	}

	if(door) {
		rotate_about_pt3([-chamWidth, chamDoorDepth - thick + chamBandWidth / 2, chamOffset + chamHeight + thick]
				, -chamDoorRotate, 0, 0) 
		{
			//chamDoor();
		}
	}

	translate([-angleWidth + angleThick, 0, chamOffset + chamHeight - chamDoorHeight + thick]) {
		chamGrades(plan);
	}

	translate([-angleWidth + angleThick, 0, chamOffset + chamHeight - chamDoorHeight + thick + 100]) {
		chamGrades(plan);
	}
}

module chamDoor() {
	union() {
		intersection() {
			chamBuild(false, false);
			translate([-(chamWidth - ((chamWidth - chamDoorWidth) / 2 )), -thick, chamOffset + chamHeight - chamDoorHeight + thick]) {
				cube([chamDoorWidth, chamDoorDepth, chamDoorHeight]);
			}
		}

		hc = chamFrontH - (chamHeight - chamDoorHeight - chamFrontBackOffset + thick)
			+ chamBandWidth / 2;
		frontHeight = chamOffset + chamHeight - chamDoorHeight + thick - chamBandWidth / 2;
		translate([-(chamWidth - ((chamWidth - chamDoorWidth) / 2 - chamBandWidth / 2))
				, -(thick + chamBandThick) 
				, frontHeight]) 
		{
			cube([chamBandWidth, chamBandThick, hc]);
		}

		translate([-(chamWidth - chamDoorWidth) / 2 - chamBandWidth / 2
				, -(thick + chamBandThick) 
				, frontHeight]) 
		{
			cube([chamBandWidth, chamBandThick, hc]);
		}

		translate([-(chamWidth - ((chamWidth - chamDoorWidth) / 2 + chamBandWidth / 2))
				, -(thick + chamBandThick) 
				, frontHeight]) 
		{
			cube([chamDoorWidth - chamBandWidth, chamBandThick, chamBandWidth]);
		}

		dB = (fbD - chamTopD) / 2;
		l = sqrt(pow(dB, 2) + pow(chamHeight - chamFrontH - chamFrontBackOffset, 2));
		h = chamHeight - chamFrontH - chamFrontBackOffset;
		angle = atan(h / dB);
		translate([-(chamWidth - chamDoorWidth) / 2 - chamBandWidth / 2
				, 0
				, chamOffset + chamFrontBackOffset + chamFrontH]) 
		{
			rotate([angle, 0, 0]) {
				translate([0, 0, thick]) {
					cube([chamBandWidth, l, chamBandThick]);
				}
			}
		}
		translate([-(chamWidth - ((chamWidth - chamDoorWidth) / 2 - chamBandWidth / 2))
				, 0
				, chamOffset + chamFrontBackOffset + chamFrontH]) 
		{
			rotate([angle, 0, 0]) {
				translate([0, 0, thick]) {
					cube([chamBandWidth, l, chamBandThick]);
				}
			}
		}

		topBandLength = chamDoorDepth - (fbD - chamTopD) / 2 - thick;
		translate([-(chamWidth - ((chamWidth - chamDoorWidth) / 2 - chamBandWidth / 2))
				, (fbD - chamTopD) / 2
				, chamOffset + chamHeight + thick]) 
		{
			cube([chamBandWidth, topBandLength + chamBandWidth / 2, chamBandThick]);
		}

		translate([-(chamWidth - chamDoorWidth) / 2 - chamBandWidth / 2
				, (fbD - chamTopD) / 2
				, chamOffset + chamHeight + thick]) 
		{
			cube([chamBandWidth, topBandLength + chamBandWidth / 2, chamBandThick]);
		}

		translate([-(chamWidth - ((chamWidth - chamDoorWidth) / 2 + chamBandWidth / 2))
				, (fbD - chamTopD) / 2 + topBandLength - chamBandWidth / 2
				, chamOffset + chamHeight + thick]) 
		{
			cube([chamDoorWidth - chamBandWidth, chamBandWidth, chamBandThick]);
		}
	}
}

module chamPlan(plan = false) {
	chamBottom(plan);
	translate([0, chamBottomD + 220, 0]) {
		chamTop(plan);
		translate([0, chamTopD + 220, 0]) {
			chamBottomFront(plan);
			translate([0, chamTopD + 220, 0]) {
				chamBack(plan);
			}
		}

	}
	translate([chamWidth + 200, 0, 0]) {
		chamBottomBack(plan);
		dB = (fbD - chamTopD) / 2;
		h = sqrt(pow(dB, 2) + pow(chamHeight - chamBackH - chamFrontBackOffset, 2));
		translate([0, h + 200, 0]) {
			chamBackTop(plan);
			dB2 = (fbD - chamTopD) / 2;
			h2 = sqrt(pow(dB, 2) + pow(chamHeight - chamFrontH - chamFrontBackOffset, 2));
			translate([0, h2 + 200, 0]) {
				chamFrontTop(plan);
				translate([0, chamTopD + 220, 0]) {
					chamFront(plan);
				}
			}
		}
	}

	translate([chamWidth * 2 + 500, 0, 0]) {
		chamFace(plan);
	}
}

module fb(plan = false) {
	if(plan) {
		fbPlan(plan);
	} else {
		fbBuild(plan);
	}
}

module ss(plan = false) {
	if(plan) {
		ssPlan(plan);
	} else {
		ssBuild(plan);
	}
}

module cham(plan = false) {
	if(plan) {
		chamPlan(plan);
	} else {
		chamBuild(plan);
	}
}

module exhaustBuild() {
	dbt = (fbD - chamTopD) / 2;
	h = chamHeight - chamBackH - chamFrontBackOffset;
	angle = atan(h / dbt);

	echo(str("Exhaust tube angle ", angle));

	translate([-100, fbD - tubeSide * 1.0, chamOffset + chamFrontBackOffset + chamBackH]) {
		difference() {
			tube(700);
			translate([0,-200,-200]) {
				rotate_about_pt3([0,300,200],-angle,0,0) {
					cube([tubeSide,300,200]);
				}
			}
		}
	}

	translate([-chamWidth + 5, fbD - tubeSide * 1.0, chamOffset + chamFrontBackOffset + chamBackH]) {
		difference() {
			tube(700);
			translate([0,-200,-200]) {
				rotate_about_pt3([0,300,200],-angle,0,0) {
					cube([tubeSide,300,200]);
				}
			}
		}
	}
}

// Firebox End


// Plan
module showPlan() {
	fb(true);
	translate([(fbW < fbH ? fbH : fbW) * 2 + 400, 0, 0]) {
		ss(true);
	}
	
	translate([0, (fbH < fbD ? fbD : fbH) * 3 + 700, 0]) {
		cham(true);
	}
}

// Build
module showBuild() {
	translate([-1000,0,0]) {
		fb(false);
		//ss(false);
		cham(false);
		//exhaustBuild();
	}
}

showBuild();
showPlan();
